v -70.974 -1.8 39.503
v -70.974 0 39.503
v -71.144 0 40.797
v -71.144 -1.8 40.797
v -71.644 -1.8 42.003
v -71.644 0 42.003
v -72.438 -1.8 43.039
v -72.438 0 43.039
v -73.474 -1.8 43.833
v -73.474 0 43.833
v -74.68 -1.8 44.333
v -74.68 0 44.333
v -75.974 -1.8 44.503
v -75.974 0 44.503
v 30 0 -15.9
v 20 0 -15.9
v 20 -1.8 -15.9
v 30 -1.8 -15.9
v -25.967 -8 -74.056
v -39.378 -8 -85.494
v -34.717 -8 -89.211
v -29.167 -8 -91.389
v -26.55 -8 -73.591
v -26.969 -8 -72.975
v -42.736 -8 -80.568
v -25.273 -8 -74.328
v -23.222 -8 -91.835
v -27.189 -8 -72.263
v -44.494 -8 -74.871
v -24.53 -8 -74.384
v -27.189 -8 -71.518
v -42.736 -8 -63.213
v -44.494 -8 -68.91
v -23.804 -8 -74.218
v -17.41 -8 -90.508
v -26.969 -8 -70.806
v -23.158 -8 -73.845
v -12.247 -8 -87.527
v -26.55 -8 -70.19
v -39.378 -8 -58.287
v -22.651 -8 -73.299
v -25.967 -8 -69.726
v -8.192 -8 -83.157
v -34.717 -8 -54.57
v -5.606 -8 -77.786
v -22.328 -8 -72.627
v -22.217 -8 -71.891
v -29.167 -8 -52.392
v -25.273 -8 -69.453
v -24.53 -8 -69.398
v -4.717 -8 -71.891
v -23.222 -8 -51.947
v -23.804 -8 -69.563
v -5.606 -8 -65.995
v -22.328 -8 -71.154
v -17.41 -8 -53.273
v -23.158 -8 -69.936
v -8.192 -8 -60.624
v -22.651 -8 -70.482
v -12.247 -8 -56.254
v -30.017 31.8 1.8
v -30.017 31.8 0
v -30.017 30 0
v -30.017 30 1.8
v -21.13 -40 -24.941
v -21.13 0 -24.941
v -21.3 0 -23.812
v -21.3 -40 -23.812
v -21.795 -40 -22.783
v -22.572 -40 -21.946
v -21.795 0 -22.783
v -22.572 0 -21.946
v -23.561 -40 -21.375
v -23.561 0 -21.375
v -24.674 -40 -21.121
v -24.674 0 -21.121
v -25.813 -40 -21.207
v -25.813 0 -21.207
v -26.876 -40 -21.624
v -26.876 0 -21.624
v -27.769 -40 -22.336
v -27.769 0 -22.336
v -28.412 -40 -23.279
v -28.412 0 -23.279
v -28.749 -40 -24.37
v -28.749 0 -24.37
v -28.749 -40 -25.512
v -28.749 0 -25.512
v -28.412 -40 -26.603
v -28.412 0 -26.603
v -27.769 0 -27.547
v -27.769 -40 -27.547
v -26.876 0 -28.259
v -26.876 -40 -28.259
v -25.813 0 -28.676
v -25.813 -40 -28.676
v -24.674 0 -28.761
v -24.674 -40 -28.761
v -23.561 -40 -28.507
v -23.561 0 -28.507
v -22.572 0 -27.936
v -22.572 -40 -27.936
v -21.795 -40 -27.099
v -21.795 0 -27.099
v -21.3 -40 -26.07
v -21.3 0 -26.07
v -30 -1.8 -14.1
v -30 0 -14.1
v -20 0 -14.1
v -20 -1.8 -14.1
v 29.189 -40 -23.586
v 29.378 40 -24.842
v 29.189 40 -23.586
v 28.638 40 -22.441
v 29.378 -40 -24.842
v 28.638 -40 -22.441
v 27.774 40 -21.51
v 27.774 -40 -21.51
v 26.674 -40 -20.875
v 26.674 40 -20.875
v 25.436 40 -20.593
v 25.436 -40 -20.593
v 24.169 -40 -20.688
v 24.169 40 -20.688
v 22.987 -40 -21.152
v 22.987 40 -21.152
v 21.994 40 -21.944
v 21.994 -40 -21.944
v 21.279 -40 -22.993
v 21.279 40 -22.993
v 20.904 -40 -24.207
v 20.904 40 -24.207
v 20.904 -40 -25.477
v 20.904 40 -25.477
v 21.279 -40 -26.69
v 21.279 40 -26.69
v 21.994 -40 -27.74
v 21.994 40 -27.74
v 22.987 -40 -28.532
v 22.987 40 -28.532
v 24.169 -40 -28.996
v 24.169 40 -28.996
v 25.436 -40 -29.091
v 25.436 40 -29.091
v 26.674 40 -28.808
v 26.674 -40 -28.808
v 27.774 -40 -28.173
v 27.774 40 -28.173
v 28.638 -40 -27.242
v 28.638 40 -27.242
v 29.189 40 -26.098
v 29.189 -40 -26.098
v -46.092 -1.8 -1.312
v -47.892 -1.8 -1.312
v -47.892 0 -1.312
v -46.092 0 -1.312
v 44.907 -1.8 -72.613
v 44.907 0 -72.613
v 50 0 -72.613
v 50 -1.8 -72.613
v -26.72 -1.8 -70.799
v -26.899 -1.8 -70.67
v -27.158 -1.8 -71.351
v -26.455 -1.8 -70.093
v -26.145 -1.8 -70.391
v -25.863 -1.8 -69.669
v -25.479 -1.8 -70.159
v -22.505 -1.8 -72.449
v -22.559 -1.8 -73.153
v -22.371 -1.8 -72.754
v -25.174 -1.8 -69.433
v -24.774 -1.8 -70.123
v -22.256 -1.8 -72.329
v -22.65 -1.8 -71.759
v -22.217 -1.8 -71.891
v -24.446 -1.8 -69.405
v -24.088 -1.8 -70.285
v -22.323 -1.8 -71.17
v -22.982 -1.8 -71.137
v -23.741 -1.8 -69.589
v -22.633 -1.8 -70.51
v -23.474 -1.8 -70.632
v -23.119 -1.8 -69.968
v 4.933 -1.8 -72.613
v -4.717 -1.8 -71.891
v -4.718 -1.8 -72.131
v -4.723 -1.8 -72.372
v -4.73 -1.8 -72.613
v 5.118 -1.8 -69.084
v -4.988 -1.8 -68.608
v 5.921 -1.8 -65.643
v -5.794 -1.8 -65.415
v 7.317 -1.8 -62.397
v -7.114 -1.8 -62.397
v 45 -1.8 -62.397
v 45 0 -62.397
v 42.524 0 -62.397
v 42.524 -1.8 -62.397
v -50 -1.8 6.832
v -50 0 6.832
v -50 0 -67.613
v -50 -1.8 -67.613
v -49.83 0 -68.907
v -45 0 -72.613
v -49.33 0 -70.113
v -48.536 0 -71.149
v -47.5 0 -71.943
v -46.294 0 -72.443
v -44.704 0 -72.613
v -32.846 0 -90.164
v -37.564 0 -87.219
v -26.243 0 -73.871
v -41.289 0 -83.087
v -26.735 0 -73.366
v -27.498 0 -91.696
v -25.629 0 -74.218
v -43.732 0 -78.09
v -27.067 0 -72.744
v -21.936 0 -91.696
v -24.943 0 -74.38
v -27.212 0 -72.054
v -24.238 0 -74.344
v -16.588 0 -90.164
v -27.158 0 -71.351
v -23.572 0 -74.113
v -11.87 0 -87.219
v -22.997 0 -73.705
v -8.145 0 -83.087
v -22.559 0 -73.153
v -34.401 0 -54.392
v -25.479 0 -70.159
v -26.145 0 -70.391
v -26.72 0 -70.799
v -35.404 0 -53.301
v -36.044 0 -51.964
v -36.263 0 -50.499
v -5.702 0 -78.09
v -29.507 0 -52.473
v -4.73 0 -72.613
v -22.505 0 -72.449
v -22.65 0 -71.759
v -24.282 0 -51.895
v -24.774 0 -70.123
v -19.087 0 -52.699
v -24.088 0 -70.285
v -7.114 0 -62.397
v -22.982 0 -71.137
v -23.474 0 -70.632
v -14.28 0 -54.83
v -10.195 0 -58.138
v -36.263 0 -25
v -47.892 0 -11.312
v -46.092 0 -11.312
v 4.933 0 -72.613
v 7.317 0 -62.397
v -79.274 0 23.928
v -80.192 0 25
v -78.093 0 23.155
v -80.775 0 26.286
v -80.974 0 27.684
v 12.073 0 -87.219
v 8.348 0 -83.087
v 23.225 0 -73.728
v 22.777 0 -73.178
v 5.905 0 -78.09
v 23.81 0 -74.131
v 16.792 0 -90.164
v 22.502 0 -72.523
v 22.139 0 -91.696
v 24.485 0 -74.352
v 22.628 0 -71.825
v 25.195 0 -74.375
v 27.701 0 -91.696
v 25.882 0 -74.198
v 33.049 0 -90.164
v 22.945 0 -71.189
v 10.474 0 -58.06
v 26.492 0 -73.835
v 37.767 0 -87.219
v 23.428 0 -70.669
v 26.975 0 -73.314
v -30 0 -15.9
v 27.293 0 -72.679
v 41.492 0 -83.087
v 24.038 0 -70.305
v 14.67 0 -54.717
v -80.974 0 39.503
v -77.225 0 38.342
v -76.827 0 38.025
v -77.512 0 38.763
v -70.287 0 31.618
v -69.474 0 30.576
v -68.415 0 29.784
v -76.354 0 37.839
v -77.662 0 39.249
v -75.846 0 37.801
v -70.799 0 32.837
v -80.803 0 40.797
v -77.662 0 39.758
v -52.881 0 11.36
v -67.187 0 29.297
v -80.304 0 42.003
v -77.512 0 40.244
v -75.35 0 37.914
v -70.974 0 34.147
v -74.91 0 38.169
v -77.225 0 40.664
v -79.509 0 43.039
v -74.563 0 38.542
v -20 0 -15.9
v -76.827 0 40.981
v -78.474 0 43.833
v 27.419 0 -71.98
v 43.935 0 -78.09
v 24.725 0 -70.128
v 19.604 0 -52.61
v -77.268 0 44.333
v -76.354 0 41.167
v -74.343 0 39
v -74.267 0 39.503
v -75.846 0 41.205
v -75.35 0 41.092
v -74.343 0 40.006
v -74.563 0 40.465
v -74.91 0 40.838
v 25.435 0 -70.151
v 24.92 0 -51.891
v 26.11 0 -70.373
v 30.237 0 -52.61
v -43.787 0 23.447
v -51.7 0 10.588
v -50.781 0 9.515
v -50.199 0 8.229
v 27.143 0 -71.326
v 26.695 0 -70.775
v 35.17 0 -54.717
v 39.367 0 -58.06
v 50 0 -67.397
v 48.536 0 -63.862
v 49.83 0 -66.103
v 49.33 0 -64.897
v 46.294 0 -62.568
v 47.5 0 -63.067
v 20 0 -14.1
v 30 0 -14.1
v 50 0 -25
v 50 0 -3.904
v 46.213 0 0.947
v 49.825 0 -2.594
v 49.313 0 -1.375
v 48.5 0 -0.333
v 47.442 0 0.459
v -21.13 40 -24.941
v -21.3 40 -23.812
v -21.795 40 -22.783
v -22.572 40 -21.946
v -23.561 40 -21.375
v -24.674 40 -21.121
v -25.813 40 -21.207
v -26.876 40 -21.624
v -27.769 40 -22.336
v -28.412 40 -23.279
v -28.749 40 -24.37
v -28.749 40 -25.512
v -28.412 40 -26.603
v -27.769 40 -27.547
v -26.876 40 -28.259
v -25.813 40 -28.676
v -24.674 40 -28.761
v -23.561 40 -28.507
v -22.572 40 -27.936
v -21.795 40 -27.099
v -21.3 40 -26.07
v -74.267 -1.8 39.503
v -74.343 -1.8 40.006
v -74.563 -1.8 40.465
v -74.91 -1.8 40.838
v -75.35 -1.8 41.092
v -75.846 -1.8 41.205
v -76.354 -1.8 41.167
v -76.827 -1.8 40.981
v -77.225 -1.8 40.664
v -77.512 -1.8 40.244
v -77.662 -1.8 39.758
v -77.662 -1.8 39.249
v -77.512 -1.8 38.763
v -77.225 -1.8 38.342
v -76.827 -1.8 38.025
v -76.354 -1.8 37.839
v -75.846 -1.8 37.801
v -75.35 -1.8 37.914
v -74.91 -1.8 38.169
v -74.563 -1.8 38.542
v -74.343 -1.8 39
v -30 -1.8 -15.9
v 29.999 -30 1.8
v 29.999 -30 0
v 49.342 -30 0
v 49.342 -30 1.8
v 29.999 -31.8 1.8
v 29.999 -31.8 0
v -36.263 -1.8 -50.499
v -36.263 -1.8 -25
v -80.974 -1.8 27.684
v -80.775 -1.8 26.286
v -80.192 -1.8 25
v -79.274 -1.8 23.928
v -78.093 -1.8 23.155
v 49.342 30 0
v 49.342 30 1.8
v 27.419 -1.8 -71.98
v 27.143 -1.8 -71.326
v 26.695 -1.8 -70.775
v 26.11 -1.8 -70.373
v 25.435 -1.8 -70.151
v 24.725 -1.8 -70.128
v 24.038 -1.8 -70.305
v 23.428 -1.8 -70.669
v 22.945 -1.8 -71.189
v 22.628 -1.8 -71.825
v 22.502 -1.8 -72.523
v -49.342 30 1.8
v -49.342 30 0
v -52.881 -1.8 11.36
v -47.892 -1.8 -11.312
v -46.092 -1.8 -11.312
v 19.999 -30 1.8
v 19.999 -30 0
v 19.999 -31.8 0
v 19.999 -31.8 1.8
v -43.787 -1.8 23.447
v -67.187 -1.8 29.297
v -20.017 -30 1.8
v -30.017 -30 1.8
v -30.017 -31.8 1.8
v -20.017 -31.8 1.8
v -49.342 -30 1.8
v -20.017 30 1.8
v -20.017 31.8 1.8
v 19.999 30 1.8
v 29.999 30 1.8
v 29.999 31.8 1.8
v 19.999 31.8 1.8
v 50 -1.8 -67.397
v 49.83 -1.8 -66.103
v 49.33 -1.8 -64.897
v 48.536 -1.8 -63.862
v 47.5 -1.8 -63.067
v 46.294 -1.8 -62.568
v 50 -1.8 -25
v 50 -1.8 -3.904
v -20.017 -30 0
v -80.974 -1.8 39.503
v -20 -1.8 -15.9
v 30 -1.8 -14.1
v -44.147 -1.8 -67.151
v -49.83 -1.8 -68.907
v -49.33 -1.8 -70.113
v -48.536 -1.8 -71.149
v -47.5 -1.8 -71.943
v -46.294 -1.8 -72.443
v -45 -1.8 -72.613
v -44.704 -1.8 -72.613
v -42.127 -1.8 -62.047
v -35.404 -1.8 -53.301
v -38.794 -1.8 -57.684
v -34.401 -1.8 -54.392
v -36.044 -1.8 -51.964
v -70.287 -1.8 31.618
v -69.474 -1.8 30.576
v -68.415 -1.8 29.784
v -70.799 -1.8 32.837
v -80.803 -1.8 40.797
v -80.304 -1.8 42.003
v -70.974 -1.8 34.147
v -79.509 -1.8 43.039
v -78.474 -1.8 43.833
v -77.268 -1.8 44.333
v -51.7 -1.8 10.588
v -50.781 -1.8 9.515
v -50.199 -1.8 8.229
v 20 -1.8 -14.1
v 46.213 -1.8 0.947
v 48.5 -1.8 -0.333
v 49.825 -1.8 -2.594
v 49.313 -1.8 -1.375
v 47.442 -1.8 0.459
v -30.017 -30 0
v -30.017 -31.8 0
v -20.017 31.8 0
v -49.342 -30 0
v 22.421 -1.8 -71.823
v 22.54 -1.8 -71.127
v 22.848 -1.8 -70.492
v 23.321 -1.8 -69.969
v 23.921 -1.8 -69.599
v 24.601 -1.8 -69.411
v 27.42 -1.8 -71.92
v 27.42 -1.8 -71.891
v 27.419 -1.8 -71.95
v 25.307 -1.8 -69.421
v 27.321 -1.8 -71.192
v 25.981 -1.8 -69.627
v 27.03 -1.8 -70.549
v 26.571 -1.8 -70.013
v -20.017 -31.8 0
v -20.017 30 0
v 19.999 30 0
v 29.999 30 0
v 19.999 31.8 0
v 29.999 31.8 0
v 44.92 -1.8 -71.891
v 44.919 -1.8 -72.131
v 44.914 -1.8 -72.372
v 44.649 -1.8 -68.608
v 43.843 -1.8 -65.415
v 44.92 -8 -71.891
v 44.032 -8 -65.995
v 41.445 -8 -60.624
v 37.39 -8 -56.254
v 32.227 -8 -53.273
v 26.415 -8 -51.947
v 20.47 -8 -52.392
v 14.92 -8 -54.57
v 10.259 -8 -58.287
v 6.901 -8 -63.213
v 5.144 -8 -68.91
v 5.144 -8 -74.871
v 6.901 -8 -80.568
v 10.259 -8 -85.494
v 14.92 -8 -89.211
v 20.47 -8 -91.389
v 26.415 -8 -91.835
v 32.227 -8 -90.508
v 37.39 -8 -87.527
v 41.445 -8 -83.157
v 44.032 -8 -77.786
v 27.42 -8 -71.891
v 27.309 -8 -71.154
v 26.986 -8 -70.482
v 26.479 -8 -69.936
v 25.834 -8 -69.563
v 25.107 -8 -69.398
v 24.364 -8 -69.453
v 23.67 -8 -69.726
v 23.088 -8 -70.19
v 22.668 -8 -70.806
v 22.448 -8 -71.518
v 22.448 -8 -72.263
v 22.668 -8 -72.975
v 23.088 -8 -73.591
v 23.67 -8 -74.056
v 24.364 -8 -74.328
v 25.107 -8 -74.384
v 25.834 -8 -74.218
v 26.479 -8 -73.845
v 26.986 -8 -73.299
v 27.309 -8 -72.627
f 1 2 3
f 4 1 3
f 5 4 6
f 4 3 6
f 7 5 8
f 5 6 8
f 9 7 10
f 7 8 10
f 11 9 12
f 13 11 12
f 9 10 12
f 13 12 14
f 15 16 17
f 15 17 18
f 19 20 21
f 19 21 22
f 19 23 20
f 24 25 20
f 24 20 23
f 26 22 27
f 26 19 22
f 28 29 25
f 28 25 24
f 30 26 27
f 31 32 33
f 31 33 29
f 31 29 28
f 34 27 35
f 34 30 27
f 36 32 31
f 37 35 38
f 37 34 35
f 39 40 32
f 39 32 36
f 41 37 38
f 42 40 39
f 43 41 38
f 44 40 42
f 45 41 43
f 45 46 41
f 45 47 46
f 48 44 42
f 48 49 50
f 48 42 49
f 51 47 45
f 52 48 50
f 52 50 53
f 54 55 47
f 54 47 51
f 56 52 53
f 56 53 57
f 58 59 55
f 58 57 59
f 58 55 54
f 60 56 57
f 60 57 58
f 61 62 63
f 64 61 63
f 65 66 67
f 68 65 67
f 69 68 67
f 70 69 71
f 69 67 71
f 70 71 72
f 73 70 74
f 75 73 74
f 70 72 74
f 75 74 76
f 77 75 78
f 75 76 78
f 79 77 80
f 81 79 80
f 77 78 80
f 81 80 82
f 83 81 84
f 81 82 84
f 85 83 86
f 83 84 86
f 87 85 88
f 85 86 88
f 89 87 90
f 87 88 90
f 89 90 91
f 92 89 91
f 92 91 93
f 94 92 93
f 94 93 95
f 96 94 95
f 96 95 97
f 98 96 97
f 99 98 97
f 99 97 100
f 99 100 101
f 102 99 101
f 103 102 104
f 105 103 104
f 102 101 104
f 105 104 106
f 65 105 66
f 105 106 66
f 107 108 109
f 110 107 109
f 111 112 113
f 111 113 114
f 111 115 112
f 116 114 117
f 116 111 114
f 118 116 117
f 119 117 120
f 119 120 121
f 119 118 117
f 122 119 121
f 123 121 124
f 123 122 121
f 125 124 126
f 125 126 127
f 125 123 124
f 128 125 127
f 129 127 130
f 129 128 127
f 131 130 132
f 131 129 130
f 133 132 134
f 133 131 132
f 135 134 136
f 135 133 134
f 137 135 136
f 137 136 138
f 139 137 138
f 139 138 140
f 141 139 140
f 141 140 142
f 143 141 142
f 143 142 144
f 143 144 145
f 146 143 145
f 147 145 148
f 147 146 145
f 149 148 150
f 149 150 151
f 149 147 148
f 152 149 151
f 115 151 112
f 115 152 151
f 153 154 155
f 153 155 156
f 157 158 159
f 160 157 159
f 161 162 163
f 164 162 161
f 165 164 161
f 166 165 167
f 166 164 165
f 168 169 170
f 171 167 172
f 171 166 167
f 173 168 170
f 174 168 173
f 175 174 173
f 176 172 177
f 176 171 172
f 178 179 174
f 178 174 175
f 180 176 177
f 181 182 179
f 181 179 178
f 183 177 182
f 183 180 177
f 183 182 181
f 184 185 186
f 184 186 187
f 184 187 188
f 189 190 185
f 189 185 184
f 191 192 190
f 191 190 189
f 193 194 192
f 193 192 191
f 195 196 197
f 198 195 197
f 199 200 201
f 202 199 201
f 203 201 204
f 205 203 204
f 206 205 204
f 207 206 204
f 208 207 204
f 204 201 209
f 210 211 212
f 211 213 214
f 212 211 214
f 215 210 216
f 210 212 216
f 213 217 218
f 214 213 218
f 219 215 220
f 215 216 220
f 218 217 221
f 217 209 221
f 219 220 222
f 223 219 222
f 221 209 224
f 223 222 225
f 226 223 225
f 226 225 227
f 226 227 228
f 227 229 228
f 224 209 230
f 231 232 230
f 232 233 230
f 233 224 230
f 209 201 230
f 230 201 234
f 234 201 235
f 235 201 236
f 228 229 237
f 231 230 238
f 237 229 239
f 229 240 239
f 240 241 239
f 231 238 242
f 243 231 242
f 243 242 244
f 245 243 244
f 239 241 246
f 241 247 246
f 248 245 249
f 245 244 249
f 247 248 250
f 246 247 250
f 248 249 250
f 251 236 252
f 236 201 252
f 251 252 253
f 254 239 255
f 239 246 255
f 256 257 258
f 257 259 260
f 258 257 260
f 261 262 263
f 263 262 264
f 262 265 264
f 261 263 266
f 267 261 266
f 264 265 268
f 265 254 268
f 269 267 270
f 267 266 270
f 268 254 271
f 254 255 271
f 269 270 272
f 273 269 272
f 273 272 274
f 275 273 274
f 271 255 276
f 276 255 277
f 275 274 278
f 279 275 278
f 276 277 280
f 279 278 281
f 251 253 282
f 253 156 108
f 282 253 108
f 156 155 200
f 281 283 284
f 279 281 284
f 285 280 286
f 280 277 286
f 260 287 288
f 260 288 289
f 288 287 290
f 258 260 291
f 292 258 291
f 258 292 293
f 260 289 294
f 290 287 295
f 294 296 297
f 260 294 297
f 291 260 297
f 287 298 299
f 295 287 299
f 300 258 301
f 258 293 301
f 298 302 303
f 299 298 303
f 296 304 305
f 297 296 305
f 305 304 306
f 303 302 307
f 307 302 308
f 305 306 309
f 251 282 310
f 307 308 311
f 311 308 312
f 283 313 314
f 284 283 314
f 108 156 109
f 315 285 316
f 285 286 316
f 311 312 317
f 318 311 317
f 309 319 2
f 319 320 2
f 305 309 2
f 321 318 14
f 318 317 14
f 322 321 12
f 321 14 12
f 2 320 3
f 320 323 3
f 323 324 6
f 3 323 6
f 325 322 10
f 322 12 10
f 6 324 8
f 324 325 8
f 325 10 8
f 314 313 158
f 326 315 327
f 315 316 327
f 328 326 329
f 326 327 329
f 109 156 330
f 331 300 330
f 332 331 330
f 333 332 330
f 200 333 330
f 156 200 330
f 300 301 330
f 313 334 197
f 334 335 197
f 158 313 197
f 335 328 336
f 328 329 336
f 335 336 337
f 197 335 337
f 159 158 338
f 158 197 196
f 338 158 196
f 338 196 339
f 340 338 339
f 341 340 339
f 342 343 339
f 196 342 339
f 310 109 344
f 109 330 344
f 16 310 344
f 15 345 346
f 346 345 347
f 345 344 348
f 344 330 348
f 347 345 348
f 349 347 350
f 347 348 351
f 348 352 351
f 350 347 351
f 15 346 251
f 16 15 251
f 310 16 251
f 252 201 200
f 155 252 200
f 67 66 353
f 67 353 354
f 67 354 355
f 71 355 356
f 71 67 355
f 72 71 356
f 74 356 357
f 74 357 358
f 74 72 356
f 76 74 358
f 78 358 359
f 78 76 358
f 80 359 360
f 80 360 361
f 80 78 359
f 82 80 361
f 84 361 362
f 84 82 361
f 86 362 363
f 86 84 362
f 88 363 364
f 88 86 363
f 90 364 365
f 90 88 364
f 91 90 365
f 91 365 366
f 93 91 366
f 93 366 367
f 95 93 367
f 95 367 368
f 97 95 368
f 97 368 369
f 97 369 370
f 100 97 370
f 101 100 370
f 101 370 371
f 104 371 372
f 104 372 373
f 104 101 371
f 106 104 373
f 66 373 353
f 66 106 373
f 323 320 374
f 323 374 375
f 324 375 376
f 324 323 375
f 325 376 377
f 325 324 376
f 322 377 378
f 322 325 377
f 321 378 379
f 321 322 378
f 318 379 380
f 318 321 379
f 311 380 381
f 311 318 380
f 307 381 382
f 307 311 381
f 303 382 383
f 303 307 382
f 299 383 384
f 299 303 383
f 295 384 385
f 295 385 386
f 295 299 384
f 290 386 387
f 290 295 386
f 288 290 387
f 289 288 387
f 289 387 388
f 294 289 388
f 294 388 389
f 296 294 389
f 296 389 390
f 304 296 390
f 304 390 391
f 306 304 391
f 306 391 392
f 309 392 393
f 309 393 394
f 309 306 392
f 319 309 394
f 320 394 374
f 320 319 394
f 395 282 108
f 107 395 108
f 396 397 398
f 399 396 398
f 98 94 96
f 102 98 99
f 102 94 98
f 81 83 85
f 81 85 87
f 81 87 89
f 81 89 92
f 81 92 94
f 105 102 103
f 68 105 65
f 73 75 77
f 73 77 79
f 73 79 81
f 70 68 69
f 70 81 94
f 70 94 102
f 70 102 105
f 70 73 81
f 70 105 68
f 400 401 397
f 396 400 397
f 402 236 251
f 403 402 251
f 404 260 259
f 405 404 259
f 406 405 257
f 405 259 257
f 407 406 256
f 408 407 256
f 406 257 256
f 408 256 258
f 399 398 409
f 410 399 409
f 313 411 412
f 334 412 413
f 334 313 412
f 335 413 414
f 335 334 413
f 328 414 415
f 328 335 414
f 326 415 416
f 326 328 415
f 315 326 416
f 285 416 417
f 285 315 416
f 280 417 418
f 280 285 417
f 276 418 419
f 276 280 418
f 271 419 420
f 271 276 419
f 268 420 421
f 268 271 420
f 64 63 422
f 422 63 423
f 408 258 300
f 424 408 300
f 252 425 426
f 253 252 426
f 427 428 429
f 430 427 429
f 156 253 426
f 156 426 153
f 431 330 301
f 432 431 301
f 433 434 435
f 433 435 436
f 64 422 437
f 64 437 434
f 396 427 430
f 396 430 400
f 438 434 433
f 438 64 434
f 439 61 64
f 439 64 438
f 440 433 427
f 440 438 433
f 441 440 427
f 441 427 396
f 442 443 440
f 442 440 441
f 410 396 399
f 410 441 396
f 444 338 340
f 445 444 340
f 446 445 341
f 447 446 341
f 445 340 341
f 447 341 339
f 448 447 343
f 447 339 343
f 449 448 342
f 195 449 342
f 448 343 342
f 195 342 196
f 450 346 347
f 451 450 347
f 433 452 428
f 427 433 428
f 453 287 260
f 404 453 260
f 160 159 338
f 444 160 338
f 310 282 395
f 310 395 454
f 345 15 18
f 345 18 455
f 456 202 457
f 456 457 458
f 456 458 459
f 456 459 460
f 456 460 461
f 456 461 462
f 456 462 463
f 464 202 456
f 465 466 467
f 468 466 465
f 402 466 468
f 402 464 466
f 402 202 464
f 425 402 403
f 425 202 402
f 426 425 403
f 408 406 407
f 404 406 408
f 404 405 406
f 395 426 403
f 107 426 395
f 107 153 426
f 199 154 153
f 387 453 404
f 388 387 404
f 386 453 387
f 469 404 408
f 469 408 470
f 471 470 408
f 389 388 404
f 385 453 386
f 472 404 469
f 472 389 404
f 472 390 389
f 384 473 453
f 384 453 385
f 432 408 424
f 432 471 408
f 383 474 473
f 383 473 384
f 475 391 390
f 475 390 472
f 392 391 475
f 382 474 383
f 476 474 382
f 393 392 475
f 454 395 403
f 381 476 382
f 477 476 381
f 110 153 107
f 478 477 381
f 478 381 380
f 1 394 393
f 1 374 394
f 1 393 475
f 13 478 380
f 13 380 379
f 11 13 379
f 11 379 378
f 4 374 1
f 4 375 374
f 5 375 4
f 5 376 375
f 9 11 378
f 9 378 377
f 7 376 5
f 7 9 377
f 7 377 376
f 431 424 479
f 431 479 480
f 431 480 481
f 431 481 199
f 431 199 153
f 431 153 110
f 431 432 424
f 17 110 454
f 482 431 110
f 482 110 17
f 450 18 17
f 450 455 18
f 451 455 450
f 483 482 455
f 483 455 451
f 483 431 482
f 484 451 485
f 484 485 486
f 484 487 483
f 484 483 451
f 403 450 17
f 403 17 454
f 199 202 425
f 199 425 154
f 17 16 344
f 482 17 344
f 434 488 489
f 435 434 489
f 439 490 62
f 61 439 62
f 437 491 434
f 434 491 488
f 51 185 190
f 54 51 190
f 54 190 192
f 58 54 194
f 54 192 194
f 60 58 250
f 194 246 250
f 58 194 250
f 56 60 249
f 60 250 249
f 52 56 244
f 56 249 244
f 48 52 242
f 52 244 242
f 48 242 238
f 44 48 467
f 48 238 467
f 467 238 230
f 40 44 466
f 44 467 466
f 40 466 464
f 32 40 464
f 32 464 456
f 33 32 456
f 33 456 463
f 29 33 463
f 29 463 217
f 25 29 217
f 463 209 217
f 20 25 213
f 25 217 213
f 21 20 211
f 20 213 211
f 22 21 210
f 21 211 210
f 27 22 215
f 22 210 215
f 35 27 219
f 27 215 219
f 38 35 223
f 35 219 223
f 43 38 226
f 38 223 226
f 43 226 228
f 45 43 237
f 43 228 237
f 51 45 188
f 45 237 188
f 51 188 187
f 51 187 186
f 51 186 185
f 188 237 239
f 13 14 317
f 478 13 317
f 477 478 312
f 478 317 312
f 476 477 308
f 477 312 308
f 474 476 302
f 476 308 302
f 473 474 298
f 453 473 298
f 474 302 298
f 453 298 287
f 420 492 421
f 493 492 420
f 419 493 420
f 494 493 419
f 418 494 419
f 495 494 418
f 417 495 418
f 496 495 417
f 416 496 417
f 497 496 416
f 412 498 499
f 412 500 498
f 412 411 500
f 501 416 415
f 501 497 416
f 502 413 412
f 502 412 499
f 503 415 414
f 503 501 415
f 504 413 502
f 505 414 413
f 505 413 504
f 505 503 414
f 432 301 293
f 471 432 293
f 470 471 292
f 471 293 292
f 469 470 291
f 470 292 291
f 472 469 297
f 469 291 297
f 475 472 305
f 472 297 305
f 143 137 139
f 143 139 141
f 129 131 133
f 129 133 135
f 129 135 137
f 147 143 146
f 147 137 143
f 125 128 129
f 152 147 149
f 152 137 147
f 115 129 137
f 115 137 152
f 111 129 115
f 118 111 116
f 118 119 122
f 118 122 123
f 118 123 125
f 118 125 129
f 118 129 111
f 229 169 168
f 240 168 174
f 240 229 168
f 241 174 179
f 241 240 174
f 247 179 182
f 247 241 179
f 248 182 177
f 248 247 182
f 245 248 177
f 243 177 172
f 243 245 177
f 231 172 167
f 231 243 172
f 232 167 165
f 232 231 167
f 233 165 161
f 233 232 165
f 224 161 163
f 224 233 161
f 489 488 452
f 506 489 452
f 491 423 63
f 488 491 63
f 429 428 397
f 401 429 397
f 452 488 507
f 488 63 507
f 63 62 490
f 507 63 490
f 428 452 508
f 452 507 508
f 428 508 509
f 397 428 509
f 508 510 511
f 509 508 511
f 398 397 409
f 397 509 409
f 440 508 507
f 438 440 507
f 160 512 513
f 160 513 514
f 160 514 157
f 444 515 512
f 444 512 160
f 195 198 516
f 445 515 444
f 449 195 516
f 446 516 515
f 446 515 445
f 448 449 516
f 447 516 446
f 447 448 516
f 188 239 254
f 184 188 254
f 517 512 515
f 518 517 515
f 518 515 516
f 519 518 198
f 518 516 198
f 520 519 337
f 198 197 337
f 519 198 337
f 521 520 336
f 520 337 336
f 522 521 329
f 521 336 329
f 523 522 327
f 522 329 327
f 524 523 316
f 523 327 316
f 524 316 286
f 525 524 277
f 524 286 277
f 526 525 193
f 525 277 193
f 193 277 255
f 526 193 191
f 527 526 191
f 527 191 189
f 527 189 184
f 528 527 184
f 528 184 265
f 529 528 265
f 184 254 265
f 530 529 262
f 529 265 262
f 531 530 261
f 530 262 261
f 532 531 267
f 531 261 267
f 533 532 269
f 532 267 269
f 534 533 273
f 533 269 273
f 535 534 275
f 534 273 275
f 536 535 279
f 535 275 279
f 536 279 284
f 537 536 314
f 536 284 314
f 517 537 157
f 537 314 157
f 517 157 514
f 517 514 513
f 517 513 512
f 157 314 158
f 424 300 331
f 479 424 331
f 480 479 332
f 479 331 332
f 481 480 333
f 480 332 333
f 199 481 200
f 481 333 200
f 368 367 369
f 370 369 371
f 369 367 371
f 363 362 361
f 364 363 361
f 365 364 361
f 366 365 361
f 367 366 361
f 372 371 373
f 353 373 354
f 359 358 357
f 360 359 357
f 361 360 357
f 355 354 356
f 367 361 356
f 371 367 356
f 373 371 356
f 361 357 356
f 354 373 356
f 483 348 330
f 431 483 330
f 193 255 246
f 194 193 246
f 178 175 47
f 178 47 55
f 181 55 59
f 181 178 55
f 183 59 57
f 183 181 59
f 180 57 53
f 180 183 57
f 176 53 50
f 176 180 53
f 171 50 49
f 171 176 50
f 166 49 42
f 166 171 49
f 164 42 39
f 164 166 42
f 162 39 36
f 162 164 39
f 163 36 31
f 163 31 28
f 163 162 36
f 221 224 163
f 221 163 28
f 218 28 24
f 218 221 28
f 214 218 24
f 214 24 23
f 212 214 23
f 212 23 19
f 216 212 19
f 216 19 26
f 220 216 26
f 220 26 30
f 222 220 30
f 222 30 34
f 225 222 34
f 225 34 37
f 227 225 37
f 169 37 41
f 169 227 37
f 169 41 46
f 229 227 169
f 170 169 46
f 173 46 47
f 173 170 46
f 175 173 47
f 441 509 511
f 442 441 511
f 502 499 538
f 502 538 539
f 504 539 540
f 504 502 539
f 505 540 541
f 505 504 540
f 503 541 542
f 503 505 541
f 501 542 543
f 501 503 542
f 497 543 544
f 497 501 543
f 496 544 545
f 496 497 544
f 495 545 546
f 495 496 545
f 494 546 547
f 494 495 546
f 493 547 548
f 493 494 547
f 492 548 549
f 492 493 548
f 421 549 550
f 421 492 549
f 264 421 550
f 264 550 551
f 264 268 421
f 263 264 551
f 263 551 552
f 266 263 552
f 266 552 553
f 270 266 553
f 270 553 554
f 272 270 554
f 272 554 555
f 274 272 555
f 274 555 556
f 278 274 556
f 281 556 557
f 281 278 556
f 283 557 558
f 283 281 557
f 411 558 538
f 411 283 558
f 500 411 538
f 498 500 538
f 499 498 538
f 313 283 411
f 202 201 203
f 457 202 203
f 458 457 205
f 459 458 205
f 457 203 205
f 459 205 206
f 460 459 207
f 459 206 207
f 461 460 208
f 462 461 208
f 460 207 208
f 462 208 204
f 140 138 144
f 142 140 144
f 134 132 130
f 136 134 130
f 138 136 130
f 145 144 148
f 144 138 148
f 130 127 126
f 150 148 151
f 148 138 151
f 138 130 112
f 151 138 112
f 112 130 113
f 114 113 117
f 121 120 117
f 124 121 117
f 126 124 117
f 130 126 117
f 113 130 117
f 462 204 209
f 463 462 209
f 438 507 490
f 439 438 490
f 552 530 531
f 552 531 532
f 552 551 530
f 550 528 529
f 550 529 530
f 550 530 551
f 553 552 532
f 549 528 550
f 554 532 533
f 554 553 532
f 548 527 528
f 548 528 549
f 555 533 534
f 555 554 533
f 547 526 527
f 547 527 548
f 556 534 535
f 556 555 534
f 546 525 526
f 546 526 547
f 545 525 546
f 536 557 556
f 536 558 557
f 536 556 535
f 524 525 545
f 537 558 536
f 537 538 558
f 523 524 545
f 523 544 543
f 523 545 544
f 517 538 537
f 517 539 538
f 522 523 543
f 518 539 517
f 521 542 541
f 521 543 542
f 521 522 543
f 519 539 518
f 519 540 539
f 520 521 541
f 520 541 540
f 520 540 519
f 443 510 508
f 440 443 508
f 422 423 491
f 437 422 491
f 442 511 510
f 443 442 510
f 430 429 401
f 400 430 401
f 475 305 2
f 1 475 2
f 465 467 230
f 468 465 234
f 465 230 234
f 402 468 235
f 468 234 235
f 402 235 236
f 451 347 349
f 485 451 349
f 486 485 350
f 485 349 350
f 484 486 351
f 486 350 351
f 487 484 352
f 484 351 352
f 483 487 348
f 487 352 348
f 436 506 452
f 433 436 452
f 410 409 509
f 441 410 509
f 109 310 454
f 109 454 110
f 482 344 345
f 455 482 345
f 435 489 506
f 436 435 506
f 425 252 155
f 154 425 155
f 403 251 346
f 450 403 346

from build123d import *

# Parameters (mm, degrees)
F0_R     = 2.5
F0_W     = 1.8
F0_H     = 10
F0_W_2   = 10
F0_H_2   = 1.8
F0_R_2   = 1.707
F1_DEPTH = 1.8
F2_R     = 3.830747
F2_R_2   = 4.260889
F3_DEPTH = 40
F5_DEPTH = 1.8
F6_R     = 20
F6_R_2   = 2.5
F7_DEPTH = 8
F8_DEPTH = 8


with BuildPart() as f1:
    # F0 (on Front) → F1 (new body)
    with BuildSketch(Plane.XZ):
        with BuildLine():
            Line((35, -25), (50, -25))
            Line((50, -25), (50, -3.903882))
            ThreePointArc((50, -3.903882), (48.941027, -0.826821), (46.212678, 0.94683))
            Line((46.212678, 0.94683), (-43.787322, 23.44683))
            Line((-43.787322, 23.44683), (-67.186507, 29.296627))
            ThreePointArc((-67.186507, 29.296627), (-69.914856, 31.070278), (-70.973829, 34.147339))
            Line((-70.973829, 34.147339), (-70.973829, 39.503149))
            ThreePointArc((-70.973829, 39.503149), (-72.438295, 43.038683), (-75.973829, 44.503149))
            ThreePointArc((-75.973829, 44.503149), (-79.509363, 43.038683), (-80.973829, 39.503149))
            Line((-80.973829, 39.503149), (-80.973829, 27.684096))
            ThreePointArc((-80.973829, 27.684096), (-80.192469, 25.000242), (-78.0926, 23.15521))
            Line((-78.0926, 23.15521), (-52.881229, 11.360454))
            ThreePointArc((-52.881229, 11.360454), (-50.78136, 9.515422), (-50, 6.831568))
            Line((-50, 6.831568), (-50, -15))
            Line((-50, -15), (-50, -25))
            Line((-50, -25), (-50, -67.612971))
            ThreePointArc((-50, -67.612971), (-48.535534, -71.148505), (-45, -72.612971))
            Line((-45, -72.612971), (-30, -72.612971))
            ThreePointArc((-30, -72.612971), (-25, -77.612971), (-20, -72.612971))
            Line((-20, -72.612971), (20, -72.612971))
            ThreePointArc((20, -72.612971), (25, -77.612971), (30, -72.612971))
            Line((30, -72.612971), (50, -72.612971))
            Line((50, -72.612971), (50, -67.397439))
            ThreePointArc((50, -67.397439), (48.535534, -63.861905), (45, -62.397439))
            Line((45, -62.397439), (-22.163229, -62.397439))
            ThreePointArc((-22.163229, -62.397439), (-23.756557, -62.136775), (-25.183755, -61.381962))
            Line((-25.183755, -61.381962), (-34.283597, -54.483693))
            ThreePointArc((-34.283597, -54.483693), (-35.74094, -52.723734), (-36.263071, -50.49917))
            Line((-36.263071, -50.49917), (-36.263071, -25))
            Line((-36.263071, -25), (-35, -25))
            Line((-35, -25), (35, -25))
        make_face()
        with Locations((-25, -72.612971)):
            Circle(F0_R, mode=Mode.SUBTRACT)
        with Locations((25, -72.612971)):
            Circle(F0_R, mode=Mode.SUBTRACT)
        with Locations((-46.992358, -6.311593)):
            Rectangle(F0_W, F0_H, mode=Mode.SUBTRACT)
        with Locations((-25, -15)):
            Rectangle(F0_W_2, F0_H_2, mode=Mode.SUBTRACT)
        with Locations((-75.973829, 39.503149)):
            Circle(F0_R_2, mode=Mode.SUBTRACT)
        with Locations((25, -15)):
            Rectangle(F0_W_2, F0_H_2, mode=Mode.SUBTRACT)
    extrude(amount=F1_DEPTH)

    # F6 (on Front) → F7 (join)
    with BuildSketch(Plane.XZ):
        with Locations((24.920197, -71.8906)):
            Circle(F6_R)
        with Locations((24.920197, -71.8906)):
            Circle(F6_R_2, mode=Mode.SUBTRACT)
    extrude(amount=F7_DEPTH)

    # F6 (on Front) → F8 (join)
    with BuildSketch(Plane.XZ):
        with Locations((-24.717046, -71.8906)):
            Circle(F6_R)
        with Locations((-24.717046, -71.8906)):
            Circle(F6_R_2, mode=Mode.SUBTRACT)
    extrude(amount=F8_DEPTH)


with BuildPart() as f3:
    # F2 (on Front) → F3 (new body, symmetric)
    with BuildSketch(Plane.XZ):
        with Locations((-24.960551, -24.941267)):
            Circle(F2_R)
        with Locations((25.117559, -24.841683)):
            Circle(F2_R_2)
    extrude(amount=F3_DEPTH, both=True)


with BuildPart() as f5:
    # F4 (on Top) → F5 (new body)
    with BuildSketch(Plane.XY):
        Polygon((-30.017117, 30), (-49.342186, 30), (-49.342186, -30), (-30.017117, -30), (-30.017117, -31.8), (-20.017117, -31.8), (-20.017117, -30), (19.998559, -30), (19.998559, -31.8), (29.998559, -31.8), (29.998559, -30), (49.342186, -30), (49.342186, 30), (29.998559, 30), (29.998559, 31.8), (19.998559, 31.8), (19.998559, 30), (-20.017117, 30), (-20.017117, 31.8), (-30.017117, 31.8), align=None)
    extrude(amount=F5_DEPTH)


solid = Compound([f1.part, f3.part, f5.part])
